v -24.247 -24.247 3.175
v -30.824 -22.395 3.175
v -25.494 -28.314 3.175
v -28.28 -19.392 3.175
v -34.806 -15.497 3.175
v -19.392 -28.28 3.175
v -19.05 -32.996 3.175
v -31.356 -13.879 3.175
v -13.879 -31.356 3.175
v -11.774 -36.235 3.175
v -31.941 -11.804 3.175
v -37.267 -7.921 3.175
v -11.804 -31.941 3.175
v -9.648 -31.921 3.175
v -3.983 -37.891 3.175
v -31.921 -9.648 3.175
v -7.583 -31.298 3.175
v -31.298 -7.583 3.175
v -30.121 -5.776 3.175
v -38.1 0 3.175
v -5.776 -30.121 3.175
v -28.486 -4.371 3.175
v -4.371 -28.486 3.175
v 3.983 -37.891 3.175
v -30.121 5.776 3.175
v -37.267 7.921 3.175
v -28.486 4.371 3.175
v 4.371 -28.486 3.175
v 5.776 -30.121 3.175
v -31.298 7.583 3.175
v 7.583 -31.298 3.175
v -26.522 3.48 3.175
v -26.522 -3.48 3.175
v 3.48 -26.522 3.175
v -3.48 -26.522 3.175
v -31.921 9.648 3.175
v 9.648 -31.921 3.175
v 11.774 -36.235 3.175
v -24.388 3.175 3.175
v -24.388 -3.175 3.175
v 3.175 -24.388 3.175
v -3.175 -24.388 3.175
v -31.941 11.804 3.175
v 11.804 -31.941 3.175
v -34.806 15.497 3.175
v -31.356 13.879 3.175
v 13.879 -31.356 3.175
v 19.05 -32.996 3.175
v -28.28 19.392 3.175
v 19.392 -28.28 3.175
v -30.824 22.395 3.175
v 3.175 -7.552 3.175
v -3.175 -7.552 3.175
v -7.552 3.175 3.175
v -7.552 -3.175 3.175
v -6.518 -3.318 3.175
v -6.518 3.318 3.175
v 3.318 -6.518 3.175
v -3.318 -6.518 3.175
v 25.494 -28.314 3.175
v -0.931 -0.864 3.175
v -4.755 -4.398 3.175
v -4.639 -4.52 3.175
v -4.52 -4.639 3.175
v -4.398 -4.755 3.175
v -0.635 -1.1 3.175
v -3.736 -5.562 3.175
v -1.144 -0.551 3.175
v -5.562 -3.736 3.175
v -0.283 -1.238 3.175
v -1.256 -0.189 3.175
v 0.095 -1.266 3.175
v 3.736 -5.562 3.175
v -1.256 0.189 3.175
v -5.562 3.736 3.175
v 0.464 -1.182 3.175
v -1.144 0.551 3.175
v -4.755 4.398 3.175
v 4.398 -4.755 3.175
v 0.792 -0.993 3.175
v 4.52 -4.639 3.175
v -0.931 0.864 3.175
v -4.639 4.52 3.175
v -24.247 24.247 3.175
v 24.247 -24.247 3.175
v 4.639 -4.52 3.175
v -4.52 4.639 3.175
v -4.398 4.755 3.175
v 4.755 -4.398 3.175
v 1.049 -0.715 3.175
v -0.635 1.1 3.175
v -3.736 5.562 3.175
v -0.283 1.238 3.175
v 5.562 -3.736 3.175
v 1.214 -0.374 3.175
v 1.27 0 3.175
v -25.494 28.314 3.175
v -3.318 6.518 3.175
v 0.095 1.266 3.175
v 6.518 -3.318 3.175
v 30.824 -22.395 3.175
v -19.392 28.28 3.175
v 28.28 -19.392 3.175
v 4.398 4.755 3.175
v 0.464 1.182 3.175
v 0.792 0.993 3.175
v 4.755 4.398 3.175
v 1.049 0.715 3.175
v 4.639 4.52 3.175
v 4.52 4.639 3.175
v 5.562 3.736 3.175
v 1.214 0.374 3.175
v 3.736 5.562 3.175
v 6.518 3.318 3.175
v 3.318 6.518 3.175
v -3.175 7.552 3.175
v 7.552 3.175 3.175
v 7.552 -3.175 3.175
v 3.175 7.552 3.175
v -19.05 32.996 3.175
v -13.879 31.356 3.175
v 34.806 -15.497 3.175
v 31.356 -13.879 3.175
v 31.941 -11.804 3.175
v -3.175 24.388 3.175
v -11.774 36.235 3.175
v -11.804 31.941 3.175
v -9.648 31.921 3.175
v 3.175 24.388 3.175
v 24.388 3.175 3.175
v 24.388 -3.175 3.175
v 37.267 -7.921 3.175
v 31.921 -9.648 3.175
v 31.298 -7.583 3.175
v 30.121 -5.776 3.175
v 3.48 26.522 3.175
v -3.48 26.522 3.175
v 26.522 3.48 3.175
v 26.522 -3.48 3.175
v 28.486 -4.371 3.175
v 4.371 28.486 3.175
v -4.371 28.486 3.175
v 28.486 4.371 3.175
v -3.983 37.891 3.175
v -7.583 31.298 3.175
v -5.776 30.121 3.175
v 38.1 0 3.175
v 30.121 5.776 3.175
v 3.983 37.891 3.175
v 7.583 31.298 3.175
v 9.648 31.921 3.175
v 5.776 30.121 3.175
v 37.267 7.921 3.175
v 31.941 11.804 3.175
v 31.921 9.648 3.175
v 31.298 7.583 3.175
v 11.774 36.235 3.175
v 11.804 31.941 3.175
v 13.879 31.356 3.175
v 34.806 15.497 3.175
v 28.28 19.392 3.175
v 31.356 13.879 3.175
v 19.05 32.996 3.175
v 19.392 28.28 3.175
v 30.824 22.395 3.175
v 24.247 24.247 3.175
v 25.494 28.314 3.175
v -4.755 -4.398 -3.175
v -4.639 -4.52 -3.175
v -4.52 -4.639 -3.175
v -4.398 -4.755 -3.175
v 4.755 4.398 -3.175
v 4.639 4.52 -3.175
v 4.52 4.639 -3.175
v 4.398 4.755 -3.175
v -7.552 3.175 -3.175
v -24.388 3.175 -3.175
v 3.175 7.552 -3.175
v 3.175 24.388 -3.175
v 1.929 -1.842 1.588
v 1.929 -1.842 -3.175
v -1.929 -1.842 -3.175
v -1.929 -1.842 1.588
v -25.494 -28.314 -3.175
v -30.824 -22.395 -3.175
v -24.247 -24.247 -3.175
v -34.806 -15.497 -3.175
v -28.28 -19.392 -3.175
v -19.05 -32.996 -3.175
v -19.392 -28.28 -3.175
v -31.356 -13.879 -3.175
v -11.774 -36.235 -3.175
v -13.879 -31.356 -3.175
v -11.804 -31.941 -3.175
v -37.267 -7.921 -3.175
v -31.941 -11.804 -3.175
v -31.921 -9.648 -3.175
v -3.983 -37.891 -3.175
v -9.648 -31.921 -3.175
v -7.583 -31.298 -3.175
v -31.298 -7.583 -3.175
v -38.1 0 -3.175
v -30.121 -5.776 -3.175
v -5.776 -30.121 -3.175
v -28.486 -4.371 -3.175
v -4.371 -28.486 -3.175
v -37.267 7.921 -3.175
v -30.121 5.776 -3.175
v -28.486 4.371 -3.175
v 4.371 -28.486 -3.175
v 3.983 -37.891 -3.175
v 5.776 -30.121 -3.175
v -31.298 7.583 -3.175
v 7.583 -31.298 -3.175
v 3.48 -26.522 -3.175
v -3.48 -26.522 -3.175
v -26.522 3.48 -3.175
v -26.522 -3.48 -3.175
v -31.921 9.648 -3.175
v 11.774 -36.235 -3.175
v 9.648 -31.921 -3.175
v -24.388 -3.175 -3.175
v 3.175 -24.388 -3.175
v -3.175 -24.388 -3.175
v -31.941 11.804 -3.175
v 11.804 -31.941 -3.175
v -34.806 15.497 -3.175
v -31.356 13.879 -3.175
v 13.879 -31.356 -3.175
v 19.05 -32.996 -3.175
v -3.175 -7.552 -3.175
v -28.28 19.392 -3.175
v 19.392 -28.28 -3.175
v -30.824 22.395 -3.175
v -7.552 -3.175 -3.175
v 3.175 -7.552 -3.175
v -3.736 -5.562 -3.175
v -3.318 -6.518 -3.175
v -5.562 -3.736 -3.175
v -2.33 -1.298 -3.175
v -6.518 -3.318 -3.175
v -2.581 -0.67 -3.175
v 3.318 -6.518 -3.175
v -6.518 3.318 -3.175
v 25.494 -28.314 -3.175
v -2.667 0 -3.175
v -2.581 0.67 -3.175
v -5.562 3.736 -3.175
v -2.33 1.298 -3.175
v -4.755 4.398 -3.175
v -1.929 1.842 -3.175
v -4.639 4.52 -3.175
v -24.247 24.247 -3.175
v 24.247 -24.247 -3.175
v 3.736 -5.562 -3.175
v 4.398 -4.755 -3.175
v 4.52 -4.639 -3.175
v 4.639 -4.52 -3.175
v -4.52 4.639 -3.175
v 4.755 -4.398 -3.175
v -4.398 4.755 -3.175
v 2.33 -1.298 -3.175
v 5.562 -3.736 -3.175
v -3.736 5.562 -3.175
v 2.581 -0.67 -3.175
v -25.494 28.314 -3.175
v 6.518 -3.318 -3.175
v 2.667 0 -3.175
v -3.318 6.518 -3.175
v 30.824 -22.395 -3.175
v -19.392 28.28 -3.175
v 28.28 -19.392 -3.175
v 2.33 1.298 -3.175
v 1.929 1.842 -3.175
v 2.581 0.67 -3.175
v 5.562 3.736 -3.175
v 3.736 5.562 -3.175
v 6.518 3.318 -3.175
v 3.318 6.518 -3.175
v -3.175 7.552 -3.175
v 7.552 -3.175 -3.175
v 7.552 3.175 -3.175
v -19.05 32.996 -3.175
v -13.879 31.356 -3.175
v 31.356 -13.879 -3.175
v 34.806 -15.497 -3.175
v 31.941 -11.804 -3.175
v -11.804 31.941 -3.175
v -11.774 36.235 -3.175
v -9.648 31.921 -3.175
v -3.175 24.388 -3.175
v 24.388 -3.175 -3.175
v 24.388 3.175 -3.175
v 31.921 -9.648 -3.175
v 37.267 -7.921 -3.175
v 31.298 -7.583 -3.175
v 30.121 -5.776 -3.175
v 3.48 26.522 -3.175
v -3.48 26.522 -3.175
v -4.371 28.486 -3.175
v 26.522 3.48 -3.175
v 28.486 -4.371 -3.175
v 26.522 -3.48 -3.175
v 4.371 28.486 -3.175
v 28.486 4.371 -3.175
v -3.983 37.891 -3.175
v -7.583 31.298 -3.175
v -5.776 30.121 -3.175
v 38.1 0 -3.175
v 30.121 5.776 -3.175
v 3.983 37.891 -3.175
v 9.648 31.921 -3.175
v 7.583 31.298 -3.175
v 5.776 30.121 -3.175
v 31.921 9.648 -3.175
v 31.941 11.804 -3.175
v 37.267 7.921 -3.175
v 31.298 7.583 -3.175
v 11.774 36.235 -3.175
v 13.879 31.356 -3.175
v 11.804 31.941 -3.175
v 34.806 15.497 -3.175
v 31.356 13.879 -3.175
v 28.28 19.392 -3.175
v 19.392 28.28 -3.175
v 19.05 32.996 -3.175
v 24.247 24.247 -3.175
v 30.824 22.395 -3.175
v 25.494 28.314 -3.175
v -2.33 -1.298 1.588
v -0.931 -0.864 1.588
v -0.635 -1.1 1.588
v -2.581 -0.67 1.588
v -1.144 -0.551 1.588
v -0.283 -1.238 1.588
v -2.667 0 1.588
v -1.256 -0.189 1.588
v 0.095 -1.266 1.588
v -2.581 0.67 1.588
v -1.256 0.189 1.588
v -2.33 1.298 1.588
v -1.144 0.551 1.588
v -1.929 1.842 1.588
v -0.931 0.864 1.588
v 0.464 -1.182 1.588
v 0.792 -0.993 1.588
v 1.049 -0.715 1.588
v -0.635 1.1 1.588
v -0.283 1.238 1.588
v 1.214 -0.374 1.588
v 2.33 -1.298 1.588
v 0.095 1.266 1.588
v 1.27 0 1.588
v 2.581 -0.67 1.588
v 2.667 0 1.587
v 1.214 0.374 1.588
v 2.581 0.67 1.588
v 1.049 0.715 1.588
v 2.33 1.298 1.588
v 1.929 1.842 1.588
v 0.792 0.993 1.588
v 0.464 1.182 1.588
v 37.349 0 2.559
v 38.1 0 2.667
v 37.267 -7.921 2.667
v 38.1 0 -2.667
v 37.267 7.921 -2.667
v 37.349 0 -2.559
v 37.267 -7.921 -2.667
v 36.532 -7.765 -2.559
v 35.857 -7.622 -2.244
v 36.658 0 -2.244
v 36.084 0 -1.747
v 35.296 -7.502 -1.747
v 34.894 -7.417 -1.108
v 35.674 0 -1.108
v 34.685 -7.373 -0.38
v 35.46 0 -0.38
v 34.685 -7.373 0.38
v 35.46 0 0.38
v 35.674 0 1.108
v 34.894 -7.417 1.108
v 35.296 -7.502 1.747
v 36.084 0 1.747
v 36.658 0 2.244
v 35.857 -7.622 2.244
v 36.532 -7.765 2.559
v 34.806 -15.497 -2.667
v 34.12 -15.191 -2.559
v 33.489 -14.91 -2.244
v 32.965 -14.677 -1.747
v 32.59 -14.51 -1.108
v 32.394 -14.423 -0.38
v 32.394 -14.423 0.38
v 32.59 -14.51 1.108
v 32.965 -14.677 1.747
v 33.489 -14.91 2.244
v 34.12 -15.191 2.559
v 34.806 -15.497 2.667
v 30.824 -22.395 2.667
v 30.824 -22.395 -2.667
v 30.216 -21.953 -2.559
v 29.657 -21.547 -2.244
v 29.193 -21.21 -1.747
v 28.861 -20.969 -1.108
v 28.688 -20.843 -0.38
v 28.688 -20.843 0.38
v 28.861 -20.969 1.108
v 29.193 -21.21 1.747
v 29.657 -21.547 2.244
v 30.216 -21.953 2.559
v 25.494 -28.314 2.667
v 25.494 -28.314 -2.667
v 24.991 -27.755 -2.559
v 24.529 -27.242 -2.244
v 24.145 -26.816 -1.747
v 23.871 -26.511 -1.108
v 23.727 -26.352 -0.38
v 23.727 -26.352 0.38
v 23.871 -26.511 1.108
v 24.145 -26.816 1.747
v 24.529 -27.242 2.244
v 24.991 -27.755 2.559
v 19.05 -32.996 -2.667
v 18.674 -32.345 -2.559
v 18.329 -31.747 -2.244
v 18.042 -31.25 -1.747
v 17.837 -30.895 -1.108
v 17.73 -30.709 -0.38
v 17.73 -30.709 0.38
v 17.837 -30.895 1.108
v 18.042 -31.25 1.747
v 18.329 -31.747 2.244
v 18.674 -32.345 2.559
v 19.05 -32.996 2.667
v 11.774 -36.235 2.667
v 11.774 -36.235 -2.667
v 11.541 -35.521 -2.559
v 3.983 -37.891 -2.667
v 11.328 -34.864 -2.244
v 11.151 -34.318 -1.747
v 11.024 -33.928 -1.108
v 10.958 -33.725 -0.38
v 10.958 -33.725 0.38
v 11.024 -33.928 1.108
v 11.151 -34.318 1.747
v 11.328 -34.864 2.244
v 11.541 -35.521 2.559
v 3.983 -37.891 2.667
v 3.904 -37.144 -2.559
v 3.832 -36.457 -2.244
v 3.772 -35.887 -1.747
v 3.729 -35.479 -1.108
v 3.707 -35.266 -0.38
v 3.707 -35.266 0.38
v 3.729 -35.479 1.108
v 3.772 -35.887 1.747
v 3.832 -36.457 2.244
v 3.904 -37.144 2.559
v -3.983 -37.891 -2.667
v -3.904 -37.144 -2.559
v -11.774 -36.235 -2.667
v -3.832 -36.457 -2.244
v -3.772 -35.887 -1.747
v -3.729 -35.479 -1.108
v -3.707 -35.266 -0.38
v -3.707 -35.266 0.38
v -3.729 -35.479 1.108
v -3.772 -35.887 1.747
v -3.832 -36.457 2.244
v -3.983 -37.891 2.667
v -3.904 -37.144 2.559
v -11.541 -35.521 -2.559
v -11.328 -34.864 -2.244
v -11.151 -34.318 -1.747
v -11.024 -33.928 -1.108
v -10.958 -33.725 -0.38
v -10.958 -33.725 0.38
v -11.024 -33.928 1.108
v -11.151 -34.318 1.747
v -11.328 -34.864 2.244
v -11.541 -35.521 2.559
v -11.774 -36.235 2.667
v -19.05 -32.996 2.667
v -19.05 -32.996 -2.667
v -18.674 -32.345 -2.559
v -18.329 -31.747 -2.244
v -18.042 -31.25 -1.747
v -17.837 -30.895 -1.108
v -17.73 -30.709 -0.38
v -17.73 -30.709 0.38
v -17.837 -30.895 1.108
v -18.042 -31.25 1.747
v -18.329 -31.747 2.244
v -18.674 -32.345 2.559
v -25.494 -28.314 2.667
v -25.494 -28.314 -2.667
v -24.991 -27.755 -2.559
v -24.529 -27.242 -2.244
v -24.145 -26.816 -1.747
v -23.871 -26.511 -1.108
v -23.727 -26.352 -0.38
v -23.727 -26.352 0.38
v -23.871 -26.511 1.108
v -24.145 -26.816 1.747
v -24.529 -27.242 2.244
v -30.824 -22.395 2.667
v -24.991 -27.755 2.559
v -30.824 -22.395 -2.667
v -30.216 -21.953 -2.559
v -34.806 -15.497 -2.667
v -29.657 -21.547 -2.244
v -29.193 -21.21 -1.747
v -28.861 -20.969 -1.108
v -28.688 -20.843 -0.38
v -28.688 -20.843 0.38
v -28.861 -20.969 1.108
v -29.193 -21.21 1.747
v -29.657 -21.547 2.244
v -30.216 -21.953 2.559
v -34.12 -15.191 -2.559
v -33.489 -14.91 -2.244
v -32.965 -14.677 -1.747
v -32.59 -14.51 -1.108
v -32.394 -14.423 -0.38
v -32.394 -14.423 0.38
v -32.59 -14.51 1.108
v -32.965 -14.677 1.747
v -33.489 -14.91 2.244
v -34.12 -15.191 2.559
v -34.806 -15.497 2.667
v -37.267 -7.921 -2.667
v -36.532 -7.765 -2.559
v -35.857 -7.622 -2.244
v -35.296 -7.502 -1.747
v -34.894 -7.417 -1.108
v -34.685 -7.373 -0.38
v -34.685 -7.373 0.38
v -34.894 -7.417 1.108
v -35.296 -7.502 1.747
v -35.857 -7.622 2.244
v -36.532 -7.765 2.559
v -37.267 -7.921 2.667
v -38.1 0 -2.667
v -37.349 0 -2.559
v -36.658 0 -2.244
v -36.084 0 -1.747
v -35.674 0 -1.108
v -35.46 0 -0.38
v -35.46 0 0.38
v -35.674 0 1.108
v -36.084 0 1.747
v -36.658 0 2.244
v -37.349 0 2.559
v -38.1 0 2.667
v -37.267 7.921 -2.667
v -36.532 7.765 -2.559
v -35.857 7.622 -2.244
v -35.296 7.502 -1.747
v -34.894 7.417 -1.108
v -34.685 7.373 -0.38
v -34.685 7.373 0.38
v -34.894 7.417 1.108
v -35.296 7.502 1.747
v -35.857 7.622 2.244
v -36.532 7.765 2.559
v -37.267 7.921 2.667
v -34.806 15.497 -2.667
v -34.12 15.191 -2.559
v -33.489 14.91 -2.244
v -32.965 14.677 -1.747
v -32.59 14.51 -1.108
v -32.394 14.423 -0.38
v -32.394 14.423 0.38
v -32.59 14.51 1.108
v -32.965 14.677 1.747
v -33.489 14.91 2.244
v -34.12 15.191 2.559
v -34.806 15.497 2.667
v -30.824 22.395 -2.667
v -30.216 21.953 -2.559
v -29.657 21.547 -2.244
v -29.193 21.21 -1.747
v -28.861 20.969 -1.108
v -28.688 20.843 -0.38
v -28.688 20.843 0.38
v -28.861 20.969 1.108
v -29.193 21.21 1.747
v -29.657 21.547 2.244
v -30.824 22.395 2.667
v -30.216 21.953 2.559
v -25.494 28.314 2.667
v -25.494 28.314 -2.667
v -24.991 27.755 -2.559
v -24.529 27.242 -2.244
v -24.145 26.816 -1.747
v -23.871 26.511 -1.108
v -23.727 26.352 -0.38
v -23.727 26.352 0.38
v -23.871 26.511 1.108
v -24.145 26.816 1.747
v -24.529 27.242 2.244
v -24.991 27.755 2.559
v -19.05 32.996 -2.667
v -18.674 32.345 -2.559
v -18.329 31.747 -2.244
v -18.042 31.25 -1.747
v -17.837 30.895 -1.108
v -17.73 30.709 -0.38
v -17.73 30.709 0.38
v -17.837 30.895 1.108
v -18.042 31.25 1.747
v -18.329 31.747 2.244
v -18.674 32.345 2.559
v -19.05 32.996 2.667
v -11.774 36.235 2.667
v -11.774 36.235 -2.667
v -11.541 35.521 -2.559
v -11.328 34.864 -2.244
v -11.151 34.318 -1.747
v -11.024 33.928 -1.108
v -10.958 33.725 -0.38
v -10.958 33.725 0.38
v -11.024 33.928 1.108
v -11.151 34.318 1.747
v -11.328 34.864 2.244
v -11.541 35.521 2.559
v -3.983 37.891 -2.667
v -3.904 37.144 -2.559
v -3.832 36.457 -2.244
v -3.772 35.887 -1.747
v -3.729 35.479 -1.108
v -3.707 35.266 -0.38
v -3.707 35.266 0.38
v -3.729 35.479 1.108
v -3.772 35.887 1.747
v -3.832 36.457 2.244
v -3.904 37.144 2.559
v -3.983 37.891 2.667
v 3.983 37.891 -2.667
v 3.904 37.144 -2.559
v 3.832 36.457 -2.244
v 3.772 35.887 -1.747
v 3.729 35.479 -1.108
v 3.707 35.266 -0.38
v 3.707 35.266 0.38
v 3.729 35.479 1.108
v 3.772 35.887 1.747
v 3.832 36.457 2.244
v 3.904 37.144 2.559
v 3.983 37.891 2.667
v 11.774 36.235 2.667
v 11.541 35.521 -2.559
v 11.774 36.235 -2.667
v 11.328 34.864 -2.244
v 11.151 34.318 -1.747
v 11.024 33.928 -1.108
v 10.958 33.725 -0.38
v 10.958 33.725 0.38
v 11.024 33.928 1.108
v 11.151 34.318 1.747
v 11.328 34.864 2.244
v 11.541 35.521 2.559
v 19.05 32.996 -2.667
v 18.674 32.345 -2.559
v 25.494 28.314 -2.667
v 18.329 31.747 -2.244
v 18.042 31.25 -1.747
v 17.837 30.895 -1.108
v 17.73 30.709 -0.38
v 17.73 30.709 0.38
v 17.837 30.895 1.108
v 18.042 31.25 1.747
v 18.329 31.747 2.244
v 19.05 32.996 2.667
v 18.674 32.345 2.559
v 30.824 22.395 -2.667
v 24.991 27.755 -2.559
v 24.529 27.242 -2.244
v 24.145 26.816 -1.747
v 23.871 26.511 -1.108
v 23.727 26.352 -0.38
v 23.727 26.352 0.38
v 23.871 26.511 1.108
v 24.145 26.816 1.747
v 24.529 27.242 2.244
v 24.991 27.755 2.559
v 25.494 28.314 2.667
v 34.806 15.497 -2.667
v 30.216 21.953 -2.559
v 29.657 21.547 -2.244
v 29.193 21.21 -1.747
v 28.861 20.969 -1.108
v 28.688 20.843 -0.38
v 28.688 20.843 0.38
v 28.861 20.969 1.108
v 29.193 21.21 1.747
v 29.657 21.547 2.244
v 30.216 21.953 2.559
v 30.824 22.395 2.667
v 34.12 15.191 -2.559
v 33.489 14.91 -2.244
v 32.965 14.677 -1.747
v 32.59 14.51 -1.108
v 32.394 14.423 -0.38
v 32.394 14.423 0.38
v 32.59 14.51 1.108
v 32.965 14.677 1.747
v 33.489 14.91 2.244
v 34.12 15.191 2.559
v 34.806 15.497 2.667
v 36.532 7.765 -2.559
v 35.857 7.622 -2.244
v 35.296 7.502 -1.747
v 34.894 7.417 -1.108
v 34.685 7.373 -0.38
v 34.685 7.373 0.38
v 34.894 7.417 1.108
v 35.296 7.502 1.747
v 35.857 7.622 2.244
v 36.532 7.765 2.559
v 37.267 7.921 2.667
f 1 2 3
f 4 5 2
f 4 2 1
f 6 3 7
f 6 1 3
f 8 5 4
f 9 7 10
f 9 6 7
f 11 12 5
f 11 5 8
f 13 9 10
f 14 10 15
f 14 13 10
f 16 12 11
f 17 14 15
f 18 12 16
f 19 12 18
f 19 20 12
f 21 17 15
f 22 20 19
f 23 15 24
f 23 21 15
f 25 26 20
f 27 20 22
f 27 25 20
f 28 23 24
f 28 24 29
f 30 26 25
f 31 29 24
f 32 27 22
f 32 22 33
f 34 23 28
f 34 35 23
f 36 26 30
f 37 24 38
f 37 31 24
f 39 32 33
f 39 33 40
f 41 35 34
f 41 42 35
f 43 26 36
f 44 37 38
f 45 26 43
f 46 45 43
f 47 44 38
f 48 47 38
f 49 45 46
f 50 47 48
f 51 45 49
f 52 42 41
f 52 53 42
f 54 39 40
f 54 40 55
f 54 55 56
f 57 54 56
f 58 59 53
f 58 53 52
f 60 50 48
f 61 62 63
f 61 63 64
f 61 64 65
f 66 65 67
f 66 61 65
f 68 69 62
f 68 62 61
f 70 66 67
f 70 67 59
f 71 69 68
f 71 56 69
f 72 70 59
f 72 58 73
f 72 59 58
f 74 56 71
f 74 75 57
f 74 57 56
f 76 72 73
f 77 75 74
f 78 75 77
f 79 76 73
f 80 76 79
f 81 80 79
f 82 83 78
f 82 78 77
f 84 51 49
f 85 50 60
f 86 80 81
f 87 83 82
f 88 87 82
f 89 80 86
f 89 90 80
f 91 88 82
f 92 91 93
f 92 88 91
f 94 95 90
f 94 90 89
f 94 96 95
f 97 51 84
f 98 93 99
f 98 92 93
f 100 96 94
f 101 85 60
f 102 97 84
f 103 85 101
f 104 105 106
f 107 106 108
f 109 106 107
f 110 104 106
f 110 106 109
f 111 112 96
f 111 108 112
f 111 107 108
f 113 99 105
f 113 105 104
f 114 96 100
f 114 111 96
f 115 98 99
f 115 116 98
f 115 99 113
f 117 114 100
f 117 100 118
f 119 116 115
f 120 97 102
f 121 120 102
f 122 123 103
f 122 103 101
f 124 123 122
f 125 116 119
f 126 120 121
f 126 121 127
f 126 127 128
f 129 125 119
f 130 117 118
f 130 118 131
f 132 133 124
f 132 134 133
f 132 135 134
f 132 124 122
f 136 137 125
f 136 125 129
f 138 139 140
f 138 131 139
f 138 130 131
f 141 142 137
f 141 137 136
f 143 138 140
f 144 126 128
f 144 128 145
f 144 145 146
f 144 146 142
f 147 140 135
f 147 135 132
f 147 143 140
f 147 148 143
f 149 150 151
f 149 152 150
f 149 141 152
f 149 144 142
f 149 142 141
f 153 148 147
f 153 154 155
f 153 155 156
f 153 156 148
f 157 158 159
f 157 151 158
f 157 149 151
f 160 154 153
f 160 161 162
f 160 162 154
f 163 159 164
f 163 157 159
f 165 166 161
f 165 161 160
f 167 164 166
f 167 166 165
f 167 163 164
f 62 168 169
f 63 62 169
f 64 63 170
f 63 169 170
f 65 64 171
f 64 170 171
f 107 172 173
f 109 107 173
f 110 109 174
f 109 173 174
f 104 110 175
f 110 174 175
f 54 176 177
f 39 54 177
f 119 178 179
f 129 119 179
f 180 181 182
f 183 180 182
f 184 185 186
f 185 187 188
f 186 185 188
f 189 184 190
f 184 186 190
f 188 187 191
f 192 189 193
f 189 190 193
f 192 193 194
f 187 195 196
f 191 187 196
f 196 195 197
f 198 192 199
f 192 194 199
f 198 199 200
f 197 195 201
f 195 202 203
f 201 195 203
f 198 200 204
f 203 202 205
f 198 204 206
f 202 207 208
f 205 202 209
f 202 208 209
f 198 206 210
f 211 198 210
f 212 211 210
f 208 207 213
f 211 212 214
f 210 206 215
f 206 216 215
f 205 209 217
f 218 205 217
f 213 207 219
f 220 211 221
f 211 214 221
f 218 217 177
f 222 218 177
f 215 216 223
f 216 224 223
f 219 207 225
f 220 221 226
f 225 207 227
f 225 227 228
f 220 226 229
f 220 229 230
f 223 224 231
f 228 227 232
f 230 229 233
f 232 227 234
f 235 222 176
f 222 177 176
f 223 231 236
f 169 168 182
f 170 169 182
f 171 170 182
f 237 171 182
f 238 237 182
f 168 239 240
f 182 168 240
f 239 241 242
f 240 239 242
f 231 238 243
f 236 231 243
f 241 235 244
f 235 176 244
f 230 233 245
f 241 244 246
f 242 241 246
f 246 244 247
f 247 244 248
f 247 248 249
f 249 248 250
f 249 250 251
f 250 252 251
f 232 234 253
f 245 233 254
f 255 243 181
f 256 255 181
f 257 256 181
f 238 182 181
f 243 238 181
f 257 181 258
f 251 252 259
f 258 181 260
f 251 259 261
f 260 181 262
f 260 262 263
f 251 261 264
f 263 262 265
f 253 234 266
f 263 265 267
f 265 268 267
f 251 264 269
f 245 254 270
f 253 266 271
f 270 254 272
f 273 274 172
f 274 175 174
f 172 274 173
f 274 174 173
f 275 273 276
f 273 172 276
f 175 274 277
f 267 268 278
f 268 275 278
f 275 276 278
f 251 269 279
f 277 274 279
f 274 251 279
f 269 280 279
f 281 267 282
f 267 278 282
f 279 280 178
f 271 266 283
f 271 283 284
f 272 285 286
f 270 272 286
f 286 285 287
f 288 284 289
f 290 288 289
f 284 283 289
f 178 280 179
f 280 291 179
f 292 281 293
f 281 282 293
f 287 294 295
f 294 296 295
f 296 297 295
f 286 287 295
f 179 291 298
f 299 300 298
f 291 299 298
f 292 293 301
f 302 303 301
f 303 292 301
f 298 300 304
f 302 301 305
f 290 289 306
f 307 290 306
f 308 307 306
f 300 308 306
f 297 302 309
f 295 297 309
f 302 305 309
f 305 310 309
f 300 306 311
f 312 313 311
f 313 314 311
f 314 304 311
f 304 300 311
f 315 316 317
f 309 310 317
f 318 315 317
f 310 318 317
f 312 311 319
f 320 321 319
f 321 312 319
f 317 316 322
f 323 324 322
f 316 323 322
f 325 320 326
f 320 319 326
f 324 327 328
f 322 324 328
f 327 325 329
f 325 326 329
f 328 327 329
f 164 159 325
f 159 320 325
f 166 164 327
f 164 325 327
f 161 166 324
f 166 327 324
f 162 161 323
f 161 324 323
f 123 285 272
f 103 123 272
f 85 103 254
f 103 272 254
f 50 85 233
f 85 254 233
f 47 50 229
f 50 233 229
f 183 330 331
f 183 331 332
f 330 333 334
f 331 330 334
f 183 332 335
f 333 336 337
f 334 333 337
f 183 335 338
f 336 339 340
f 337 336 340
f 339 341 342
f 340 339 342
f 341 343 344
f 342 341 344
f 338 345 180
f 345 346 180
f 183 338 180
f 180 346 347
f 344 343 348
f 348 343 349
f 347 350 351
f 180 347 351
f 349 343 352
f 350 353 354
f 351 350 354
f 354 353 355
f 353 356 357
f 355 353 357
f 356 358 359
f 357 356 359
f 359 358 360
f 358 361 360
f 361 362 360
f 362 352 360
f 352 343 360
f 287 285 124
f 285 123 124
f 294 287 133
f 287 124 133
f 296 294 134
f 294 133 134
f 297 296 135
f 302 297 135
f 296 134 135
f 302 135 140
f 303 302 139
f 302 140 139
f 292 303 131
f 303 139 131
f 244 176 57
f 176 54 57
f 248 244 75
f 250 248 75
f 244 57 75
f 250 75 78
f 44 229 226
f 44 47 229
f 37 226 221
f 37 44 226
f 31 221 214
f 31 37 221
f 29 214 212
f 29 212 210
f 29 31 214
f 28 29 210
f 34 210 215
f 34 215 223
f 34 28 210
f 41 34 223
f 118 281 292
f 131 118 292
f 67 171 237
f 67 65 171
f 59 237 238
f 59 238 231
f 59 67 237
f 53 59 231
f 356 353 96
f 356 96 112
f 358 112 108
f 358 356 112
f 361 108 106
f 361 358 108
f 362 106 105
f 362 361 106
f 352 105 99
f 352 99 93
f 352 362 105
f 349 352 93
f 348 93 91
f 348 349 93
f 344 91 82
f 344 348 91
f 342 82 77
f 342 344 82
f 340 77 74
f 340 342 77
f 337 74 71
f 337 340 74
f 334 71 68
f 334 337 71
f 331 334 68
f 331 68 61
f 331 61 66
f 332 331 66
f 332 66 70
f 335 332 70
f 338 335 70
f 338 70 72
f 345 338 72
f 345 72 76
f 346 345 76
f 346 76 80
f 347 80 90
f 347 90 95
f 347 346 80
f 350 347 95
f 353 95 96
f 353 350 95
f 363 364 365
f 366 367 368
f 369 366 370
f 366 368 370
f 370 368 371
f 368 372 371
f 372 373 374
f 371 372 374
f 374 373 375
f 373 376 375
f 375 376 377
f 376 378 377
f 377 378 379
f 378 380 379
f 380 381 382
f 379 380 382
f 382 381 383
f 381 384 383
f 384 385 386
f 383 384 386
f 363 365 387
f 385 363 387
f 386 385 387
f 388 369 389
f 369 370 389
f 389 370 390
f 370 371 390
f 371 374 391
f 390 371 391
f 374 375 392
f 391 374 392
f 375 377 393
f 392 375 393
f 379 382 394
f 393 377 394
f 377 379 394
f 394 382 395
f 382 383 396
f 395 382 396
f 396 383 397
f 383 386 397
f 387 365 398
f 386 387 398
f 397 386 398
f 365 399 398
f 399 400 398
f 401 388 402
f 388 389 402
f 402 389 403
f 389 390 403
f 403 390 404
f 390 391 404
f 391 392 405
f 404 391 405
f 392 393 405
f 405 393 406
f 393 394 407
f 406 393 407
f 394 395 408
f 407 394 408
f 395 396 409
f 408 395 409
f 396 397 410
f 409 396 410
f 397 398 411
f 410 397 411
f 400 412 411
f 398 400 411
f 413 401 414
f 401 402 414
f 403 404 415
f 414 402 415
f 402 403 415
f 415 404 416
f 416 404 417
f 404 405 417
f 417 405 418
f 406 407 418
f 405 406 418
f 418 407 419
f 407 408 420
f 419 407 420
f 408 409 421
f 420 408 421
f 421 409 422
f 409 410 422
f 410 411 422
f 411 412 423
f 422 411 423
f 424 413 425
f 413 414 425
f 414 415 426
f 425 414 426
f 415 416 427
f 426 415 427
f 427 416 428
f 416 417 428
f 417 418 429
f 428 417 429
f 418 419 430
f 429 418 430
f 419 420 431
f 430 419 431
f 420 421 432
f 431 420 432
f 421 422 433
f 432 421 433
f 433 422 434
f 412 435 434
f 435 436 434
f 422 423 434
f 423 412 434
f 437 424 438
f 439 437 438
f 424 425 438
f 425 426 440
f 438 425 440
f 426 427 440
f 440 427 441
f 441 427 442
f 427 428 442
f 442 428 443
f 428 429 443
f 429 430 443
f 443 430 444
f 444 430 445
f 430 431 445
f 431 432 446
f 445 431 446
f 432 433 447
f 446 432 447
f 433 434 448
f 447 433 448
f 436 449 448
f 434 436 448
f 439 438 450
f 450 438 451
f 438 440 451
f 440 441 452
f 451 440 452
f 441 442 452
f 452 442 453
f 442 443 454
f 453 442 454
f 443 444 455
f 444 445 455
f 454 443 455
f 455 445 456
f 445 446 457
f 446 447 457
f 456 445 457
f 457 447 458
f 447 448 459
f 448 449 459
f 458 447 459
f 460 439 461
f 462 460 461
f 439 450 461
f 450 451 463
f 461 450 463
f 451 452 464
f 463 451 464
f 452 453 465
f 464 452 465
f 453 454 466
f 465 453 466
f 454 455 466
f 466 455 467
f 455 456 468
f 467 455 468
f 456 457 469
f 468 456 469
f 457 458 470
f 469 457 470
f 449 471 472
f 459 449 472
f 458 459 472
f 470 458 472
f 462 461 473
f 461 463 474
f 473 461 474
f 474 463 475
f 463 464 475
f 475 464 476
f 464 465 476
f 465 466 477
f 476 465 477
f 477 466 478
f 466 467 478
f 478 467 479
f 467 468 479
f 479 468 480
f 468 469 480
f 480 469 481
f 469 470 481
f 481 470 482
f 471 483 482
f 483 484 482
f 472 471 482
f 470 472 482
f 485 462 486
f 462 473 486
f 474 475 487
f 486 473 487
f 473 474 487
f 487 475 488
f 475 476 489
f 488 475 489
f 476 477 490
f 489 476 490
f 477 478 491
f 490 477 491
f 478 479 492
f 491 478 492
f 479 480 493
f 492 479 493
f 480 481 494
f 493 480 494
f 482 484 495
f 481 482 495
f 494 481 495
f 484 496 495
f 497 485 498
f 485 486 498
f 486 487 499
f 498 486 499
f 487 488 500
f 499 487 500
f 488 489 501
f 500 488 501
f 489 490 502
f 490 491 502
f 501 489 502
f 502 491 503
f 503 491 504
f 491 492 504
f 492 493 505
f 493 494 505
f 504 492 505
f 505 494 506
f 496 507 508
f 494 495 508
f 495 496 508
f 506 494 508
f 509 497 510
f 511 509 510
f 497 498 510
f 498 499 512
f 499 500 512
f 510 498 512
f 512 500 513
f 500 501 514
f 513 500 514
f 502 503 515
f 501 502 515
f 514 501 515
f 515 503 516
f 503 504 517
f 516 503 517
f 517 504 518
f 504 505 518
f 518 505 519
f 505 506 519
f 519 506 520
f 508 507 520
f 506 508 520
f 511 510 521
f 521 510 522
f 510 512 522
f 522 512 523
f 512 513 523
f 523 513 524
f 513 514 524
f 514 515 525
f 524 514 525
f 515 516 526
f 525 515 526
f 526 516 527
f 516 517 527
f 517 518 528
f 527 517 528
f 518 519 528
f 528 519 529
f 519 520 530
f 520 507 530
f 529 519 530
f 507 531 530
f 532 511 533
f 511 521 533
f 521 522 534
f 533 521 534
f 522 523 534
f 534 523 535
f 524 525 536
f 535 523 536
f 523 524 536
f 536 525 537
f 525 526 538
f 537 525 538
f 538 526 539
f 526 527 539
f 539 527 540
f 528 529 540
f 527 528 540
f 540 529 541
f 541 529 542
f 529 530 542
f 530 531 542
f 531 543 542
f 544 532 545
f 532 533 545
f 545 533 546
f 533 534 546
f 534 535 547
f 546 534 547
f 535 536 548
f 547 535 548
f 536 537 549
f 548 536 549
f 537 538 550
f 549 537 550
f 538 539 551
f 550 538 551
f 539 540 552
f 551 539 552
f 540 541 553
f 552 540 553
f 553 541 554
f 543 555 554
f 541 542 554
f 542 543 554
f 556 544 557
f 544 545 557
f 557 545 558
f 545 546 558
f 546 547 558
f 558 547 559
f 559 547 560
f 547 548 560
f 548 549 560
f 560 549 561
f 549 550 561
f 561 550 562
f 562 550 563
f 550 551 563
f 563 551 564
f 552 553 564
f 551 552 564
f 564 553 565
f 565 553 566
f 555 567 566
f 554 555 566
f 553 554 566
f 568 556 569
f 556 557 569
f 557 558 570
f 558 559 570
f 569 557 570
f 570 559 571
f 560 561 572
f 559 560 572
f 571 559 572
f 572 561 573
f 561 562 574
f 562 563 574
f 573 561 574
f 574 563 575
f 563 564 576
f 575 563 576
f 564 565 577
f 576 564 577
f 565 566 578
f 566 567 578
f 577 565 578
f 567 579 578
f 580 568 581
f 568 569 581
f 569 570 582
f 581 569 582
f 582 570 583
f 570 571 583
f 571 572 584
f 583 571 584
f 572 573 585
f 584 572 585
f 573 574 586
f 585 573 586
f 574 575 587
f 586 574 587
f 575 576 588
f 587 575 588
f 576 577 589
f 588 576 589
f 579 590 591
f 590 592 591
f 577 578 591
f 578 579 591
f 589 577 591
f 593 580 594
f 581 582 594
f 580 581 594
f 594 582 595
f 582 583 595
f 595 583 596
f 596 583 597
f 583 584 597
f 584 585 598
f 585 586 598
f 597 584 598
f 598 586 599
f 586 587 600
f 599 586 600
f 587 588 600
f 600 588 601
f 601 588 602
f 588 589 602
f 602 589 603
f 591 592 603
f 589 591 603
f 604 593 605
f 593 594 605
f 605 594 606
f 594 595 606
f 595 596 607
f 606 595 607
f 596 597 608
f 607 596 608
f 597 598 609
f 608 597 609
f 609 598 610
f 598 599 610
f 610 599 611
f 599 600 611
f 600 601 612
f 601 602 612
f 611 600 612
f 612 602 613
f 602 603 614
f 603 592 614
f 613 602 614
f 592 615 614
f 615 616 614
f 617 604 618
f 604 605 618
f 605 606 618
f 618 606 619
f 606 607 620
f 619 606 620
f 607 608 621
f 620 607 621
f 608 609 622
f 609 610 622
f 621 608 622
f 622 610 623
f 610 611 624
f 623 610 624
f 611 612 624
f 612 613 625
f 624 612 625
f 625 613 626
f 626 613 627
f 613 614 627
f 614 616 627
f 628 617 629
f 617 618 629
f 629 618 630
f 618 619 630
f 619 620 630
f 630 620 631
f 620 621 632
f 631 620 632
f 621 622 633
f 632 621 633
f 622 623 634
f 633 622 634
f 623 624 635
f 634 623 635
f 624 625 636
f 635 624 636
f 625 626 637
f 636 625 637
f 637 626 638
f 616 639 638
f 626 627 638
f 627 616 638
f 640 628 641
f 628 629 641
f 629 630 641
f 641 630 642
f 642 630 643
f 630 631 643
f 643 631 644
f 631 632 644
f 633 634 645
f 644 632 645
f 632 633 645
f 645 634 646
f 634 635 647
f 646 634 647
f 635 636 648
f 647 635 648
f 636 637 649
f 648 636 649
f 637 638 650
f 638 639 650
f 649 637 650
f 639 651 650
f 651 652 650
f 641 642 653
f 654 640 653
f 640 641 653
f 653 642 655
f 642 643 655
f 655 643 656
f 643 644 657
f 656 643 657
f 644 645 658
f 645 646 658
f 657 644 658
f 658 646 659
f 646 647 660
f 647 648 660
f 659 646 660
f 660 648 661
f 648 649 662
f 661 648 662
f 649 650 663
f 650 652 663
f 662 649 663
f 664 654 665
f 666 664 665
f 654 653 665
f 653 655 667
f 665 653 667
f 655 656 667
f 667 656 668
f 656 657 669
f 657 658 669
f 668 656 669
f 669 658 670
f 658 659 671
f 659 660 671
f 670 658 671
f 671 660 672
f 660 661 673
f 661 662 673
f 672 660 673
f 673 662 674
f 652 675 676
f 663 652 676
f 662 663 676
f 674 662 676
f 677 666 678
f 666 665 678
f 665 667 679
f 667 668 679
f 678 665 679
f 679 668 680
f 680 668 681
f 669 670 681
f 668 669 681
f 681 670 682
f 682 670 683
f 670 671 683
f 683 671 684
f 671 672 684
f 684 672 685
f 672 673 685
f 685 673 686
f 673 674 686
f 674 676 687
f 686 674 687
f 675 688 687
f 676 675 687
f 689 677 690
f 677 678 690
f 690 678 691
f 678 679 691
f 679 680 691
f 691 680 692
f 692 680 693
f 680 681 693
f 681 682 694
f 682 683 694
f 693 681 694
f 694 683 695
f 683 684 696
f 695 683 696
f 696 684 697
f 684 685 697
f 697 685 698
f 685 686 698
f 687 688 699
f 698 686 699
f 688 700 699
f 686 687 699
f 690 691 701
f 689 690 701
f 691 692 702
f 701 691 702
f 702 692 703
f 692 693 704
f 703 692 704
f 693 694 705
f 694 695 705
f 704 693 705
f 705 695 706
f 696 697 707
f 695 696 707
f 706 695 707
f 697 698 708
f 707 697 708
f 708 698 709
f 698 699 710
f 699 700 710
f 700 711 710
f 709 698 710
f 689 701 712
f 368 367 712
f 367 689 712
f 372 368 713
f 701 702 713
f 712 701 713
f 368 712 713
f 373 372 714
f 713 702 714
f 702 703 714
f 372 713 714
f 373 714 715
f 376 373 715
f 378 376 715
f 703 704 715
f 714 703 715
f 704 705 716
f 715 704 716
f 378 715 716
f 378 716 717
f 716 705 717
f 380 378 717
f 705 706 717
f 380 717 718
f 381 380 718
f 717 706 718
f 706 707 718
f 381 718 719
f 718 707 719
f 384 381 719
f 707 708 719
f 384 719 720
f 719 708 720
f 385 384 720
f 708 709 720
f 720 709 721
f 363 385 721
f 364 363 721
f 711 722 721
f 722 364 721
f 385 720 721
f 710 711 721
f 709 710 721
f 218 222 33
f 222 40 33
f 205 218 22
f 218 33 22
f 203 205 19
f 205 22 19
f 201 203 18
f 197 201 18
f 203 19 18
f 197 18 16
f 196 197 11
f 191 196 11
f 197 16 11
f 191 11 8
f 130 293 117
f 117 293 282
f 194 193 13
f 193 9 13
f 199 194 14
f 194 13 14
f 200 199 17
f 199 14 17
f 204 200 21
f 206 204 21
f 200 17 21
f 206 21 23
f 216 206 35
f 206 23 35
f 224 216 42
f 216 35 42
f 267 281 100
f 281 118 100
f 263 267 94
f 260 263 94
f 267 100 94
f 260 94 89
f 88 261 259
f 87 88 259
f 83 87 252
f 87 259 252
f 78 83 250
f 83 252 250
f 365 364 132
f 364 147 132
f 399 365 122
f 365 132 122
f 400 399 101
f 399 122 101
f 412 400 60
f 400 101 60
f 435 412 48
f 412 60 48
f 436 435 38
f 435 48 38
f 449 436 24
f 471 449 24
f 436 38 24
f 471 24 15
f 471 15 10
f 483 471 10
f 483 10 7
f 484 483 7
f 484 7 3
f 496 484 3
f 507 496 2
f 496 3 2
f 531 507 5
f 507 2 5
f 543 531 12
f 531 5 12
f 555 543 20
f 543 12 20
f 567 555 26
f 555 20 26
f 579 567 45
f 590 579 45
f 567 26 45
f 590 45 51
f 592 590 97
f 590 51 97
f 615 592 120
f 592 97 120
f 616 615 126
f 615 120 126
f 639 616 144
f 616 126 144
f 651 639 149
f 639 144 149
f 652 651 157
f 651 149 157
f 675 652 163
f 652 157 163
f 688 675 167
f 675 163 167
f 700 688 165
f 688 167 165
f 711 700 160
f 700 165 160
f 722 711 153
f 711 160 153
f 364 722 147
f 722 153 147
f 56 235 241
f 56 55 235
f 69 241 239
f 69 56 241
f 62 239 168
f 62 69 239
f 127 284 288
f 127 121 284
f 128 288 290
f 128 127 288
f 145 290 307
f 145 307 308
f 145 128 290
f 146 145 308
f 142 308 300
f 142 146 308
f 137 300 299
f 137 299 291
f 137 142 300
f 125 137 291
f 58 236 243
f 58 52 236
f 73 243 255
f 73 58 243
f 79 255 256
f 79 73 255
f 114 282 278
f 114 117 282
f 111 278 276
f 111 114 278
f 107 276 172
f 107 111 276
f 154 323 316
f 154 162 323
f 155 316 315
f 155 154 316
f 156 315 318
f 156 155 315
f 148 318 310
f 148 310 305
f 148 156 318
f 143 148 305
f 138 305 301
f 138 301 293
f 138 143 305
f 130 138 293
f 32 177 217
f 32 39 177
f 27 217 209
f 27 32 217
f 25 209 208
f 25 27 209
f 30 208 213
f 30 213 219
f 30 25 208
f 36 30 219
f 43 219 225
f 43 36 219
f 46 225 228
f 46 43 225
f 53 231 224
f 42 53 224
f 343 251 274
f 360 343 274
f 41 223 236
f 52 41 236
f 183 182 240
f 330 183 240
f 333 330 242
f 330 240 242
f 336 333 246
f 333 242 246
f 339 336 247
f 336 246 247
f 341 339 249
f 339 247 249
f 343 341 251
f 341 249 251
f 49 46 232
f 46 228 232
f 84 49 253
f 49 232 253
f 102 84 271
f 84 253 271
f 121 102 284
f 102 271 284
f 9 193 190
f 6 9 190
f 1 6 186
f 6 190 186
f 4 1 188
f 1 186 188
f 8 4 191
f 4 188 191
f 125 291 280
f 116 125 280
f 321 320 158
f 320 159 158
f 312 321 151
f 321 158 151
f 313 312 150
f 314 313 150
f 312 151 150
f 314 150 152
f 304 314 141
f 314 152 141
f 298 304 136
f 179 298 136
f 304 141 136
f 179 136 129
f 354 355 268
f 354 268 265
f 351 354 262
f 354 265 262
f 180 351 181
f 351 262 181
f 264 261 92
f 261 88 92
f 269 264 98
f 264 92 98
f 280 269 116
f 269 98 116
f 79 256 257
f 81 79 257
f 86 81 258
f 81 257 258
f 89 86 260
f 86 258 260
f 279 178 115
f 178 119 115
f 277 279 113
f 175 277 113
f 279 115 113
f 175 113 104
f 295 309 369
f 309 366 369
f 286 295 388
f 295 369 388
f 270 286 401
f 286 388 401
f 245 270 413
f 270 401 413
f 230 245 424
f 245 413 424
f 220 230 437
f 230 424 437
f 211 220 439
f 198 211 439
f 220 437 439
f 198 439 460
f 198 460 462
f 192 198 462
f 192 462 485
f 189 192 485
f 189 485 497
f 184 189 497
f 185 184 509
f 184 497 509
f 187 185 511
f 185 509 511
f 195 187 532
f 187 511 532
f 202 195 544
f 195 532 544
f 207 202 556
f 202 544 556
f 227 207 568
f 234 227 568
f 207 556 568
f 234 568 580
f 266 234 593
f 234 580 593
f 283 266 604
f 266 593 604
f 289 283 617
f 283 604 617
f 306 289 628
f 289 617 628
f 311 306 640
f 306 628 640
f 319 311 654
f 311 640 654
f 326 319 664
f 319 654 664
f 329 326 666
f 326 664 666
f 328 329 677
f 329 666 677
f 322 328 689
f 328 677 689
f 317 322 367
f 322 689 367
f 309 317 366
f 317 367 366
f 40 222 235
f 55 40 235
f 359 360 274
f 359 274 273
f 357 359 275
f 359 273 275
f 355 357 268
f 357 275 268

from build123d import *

# Parameters (mm, degrees)
BOSS_EXTRUDE1_START = -6.35
SKETCH3_W           = 6.35
SKETCH3_H           = 6.35
BOSS_EXTRUDE1_DEPTH = 6.35
FILLET1_R           = 7.62
FILLET2_R           = 3.81
BOSS_EXTRUDE2_START = -1.5875
SKETCH4_R           = 1.27
BOSS_EXTRUDE2_DEPTH = 1.5875


with BuildPart() as part:
    # Sketch2 → Revolve1 (revolve)
    with BuildSketch(Plane(origin=(0, 0, 0), x_dir=(1, 0, 0), z_dir=(0, 1, 0))):
        with BuildLine():
            ThreePointArc((38.1, 2.667), (35.433, 0), (38.1, -2.667))
            Line((38.1, -2.667), (38.1, -3.175))
            Line((38.1, -3.175), (34.29, -3.175))
            Line((34.29, -3.175), (34.29, 3.175))
            Line((34.29, 3.175), (38.1, 3.175))
            Line((38.1, 3.175), (38.1, 2.667))
        make_face()
    revolve(axis=Axis((0, 0, 2.667), (0, 0, -1)))

    # Sketch3 → Boss-Extrude1 (add)
    # profile 1 of 19: a face of its own
    with BuildSketch(Plane.XY.offset(3.175).offset(BOSS_EXTRUDE1_START)):
        with BuildLine():
            ThreePointArc((-34.142692849, 3.175), (-34.29, 0), (-34.142692849, -3.175))
            Line((-34.142692849, -3.175), (-5.645432136, -3.175))
            ThreePointArc((-5.645432136, -3.175), (-6.477, 0), (-5.645432136, 3.175))
            Line((-5.645432136, 3.175), (-34.142692849, 3.175))
        make_face()
    # profile 2 of 19: a face of its own
    with BuildSketch(Plane.XY.offset(3.175).offset(BOSS_EXTRUDE1_START)):
        with BuildLine():
            Line((5.645432136, -3.175), (34.142692849, -3.175))
            ThreePointArc((34.142692849, -3.175), (34.253153415, -1.589207695), (34.29, 0))
            ThreePointArc((34.29, 0), (34.253153415, 1.589207695), (34.142692849, 3.175))
            Line((34.142692849, 3.175), (5.645432136, 3.175))
            ThreePointArc((5.645432136, 3.175), (6.265660099, 1.641046169), (6.477, 0))
            ThreePointArc((6.477, 0), (6.265660099, -1.641046169), (5.645432136, -3.175))
        make_face()
    # profile 3 of 19: a face of its own
    with BuildSketch(Plane.XY.offset(3.175).offset(BOSS_EXTRUDE1_START)):
        with BuildLine():
            ThreePointArc((-5.645432136, 3.175), (-6.477, 0), (-5.645432136, -3.175))
            Line((-5.645432136, -3.175), (-3.175, -3.175))
            Line((-3.175, -3.175), (-3.175, 3.175))
            Line((-3.175, 3.175), (-5.645432136, 3.175))
        make_face()
    # profile 4 of 19: a face of its own
    with BuildSketch(Plane.XY.offset(3.175).offset(BOSS_EXTRUDE1_START)):
        with BuildLine():
            Line((-3.175, 5.645432136), (-3.175, 3.175))
            Line((-3.175, 3.175), (3.175, 3.175))
            Line((3.175, 3.175), (3.175, 5.645432136))
            ThreePointArc((3.175, 5.645432136), (0, 6.477), (-3.175, 5.645432136))
        make_face()
    # profile 5 of 19: a face of its own
    with BuildSketch(Plane.XY.offset(3.175).offset(BOSS_EXTRUDE1_START)):
        with BuildLine():
            Line((-3.175, -5.645432136), (-3.175, -34.142692849))
            ThreePointArc((-3.175, -34.142692849), (0, -34.29), (3.175, -34.142692849))
            Line((3.175, -34.142692849), (3.175, -5.645432136))
            ThreePointArc((3.175, -5.645432136), (0, -6.477), (-3.175, -5.645432136))
        make_face()
    # profile 6 of 19: a face of its own
    with BuildSketch(Plane.XY.offset(3.175).offset(BOSS_EXTRUDE1_START)):
        with BuildLine():
            ThreePointArc((3.175, 34.142692849), (0, 34.29), (-3.175, 34.142692849))
            Line((-3.175, 34.142692849), (-3.175, 5.645432136))
            ThreePointArc((-3.175, 5.645432136), (0, 6.477), (3.175, 5.645432136))
            Line((3.175, 5.645432136), (3.175, 34.142692849))
        make_face()
    # profile 7 of 19: a face of its own
    with BuildSketch(Plane.XY.offset(3.175).offset(BOSS_EXTRUDE1_START)):
        with BuildLine():
            ThreePointArc((-3.175, 5.645432136), (-4.579930622, 4.579930622), (-5.645432136, 3.175))
            Line((-5.645432136, 3.175), (-3.175, 3.175))
            Line((-3.175, 3.175), (-3.175, 5.645432136))
        make_face()
    # profile 8 of 19: a face of its own
    with BuildSketch(Plane.XY.offset(3.175).offset(BOSS_EXTRUDE1_START)):
        with BuildLine():
            Line((3.175, 5.645432136), (3.175, 3.175))
            Line((3.175, 3.175), (5.645432136, 3.175))
            ThreePointArc((5.645432136, 3.175), (4.579930622, 4.579930622), (3.175, 5.645432136))
        make_face()
    # profile 9 of 19: a face of its own
    with BuildSketch(Plane.XY.offset(3.175).offset(BOSS_EXTRUDE1_START)):
        with BuildLine():
            Line((3.175, 3.175), (3.175, -3.175))
            Line((3.175, -3.175), (5.645432136, -3.175))
            ThreePointArc((5.645432136, -3.175), (6.265660099, -1.641046169), (6.477, 0))
            ThreePointArc((6.477, 0), (6.265660099, 1.641046169), (5.645432136, 3.175))
            Line((5.645432136, 3.175), (3.175, 3.175))
        make_face()
    # profile 10 of 19: a face of its own
    with BuildSketch(Plane.XY.offset(3.175).offset(BOSS_EXTRUDE1_START)):
        with BuildLine():
            ThreePointArc((-34.142692849, 3.175), (-34.29, 0), (-34.142692849, -3.175))
            Line((-34.142692849, -3.175), (-5.645432136, -3.175))
            ThreePointArc((-5.645432136, -3.175), (-6.477, 0), (-5.645432136, 3.175))
            Line((-5.645432136, 3.175), (-34.142692849, 3.175))
        make_face()
    # profile 11 of 19: a face of its own
    with BuildSketch(Plane.XY.offset(3.175).offset(BOSS_EXTRUDE1_START)):
        with BuildLine():
            Line((5.645432136, -3.175), (34.142692849, -3.175))
            ThreePointArc((34.142692849, -3.175), (34.253153415, -1.589207695), (34.29, 0))
            ThreePointArc((34.29, 0), (34.253153415, 1.589207695), (34.142692849, 3.175))
            Line((34.142692849, 3.175), (5.645432136, 3.175))
            ThreePointArc((5.645432136, 3.175), (6.265660099, 1.641046169), (6.477, 0))
            ThreePointArc((6.477, 0), (6.265660099, -1.641046169), (5.645432136, -3.175))
        make_face()
    # profile 12 of 19: a face of its own
    with BuildSketch(Plane.XY.offset(3.175).offset(BOSS_EXTRUDE1_START)):
        with BuildLine():
            Line((-3.175, -5.645432136), (-3.175, -34.142692849))
            ThreePointArc((-3.175, -34.142692849), (0, -34.29), (3.175, -34.142692849))
            Line((3.175, -34.142692849), (3.175, -5.645432136))
            ThreePointArc((3.175, -5.645432136), (0, -6.477), (-3.175, -5.645432136))
        make_face()
    # profile 13 of 19: a face of its own
    with BuildSketch(Plane.XY.offset(3.175).offset(BOSS_EXTRUDE1_START)):
        with BuildLine():
            ThreePointArc((3.175, 34.142692849), (0, 34.29), (-3.175, 34.142692849))
            Line((-3.175, 34.142692849), (-3.175, 5.645432136))
            ThreePointArc((-3.175, 5.645432136), (0, 6.477), (3.175, 5.645432136))
            Line((3.175, 5.645432136), (3.175, 34.142692849))
        make_face()
    # profile 14 of 19: a face of its own
    with BuildSketch(Plane.XY.offset(3.175).offset(BOSS_EXTRUDE1_START)):
        with BuildLine():
            Line((3.175, -3.175), (-3.175, -3.175))
            Line((-3.175, -3.175), (-3.175, -5.645432136))
            ThreePointArc((-3.175, -5.645432136), (0, -6.477), (3.175, -5.645432136))
            Line((3.175, -5.645432136), (3.175, -3.175))
        make_face()
    # profile 15 of 19: a face of its own
    with BuildSketch(Plane.XY.offset(3.175).offset(BOSS_EXTRUDE1_START)):
        with BuildLine():
            Line((-3.175, -3.175), (-5.645432136, -3.175))
            ThreePointArc((-5.645432136, -3.175), (-4.579930622, -4.579930622), (-3.175, -5.645432136))
            Line((-3.175, -5.645432136), (-3.175, -3.175))
        make_face()
    # profile 16 of 19: a face of its own
    with BuildSketch(Plane.XY.offset(3.175).offset(BOSS_EXTRUDE1_START)):
        with BuildLine():
            Line((5.645432136, -3.175), (3.175, -3.175))
            Line((3.175, -3.175), (3.175, -5.645432136))
            ThreePointArc((3.175, -5.645432136), (4.579930622, -4.579930622), (5.645432136, -3.175))
        make_face()
    # profile 17 of 19: a face of its own
    with BuildSketch(Plane.XY.offset(3.175).offset(BOSS_EXTRUDE1_START)):
        Rectangle(SKETCH3_W, SKETCH3_H)
        with BuildLine():
            ThreePointArc((-1.929188106, 1.8415), (0, 2.667), (1.929188106, 1.8415))
            ThreePointArc((1.929188106, 1.8415), (2.475685125, 0.991903302), (2.667, 0))
            ThreePointArc((2.667, 0), (2.475685125, -0.991903302), (1.929188106, -1.8415))
            ThreePointArc((1.929188106, -1.8415), (0, -2.667), (-1.929188106, -1.8415))
            ThreePointArc((-1.929188106, -1.8415), (-2.667, 0), (-1.929188106, 1.8415))
        make_face(mode=Mode.SUBTRACT)
    # profile 18 of 19: a face of its own
    with BuildSketch(Plane.XY.offset(3.175).offset(BOSS_EXTRUDE1_START)):
        with BuildLine():
            Line((-1.929188106, 1.8415), (1.929188106, 1.8415))
            ThreePointArc((1.929188106, 1.8415), (0, 2.667), (-1.929188106, 1.8415))
        make_face()
    # profile 19 of 19: a face of its own
    with BuildSketch(Plane.XY.offset(3.175).offset(BOSS_EXTRUDE1_START)):
        with BuildLine():
            Line((1.929188106, -1.8415), (-1.929188106, -1.8415))
            ThreePointArc((-1.929188106, -1.8415), (0, -2.667), (1.929188106, -1.8415))
        make_face()
    extrude(amount=BOSS_EXTRUDE1_DEPTH)

    # Fillet1
    fillet1_edges = [part.edges().sort_by_distance(p)[0] for p in [
        (34.142692849, -3.175, 0),
        (34.142692849, 3.175, 0),
        (3.175, 34.142692849, 0),
        (-3.175, 34.142692849, 0),
        (-34.142692849, 3.175, 0),
        (-34.142692849, -3.175, 0),
        (-3.175, -34.142692849, 0),
        (3.175, -34.142692849, 0),
    ]]
    fillet(fillet1_edges, radius=FILLET1_R)

    # Fillet2
    fillet2_edges = [part.edges().sort_by_distance(p)[0] for p in [
        (5.645432136, 3.175, 0),
        (3.175, 5.645432136, 0),
        (-3.175, 5.645432136, 0),
        (-5.645432136, 3.175, 0),
        (-5.645432136, -3.175, 0),
        (-3.175, -5.645432136, 0),
        (3.175, -5.645432136, 0),
        (5.645432136, -3.175, 0),
    ]]
    fillet(fillet2_edges, radius=FILLET2_R)

    # Sketch4 → Boss-Extrude2 (add)
    with BuildSketch(Plane.XY.offset(3.175).offset(BOSS_EXTRUDE2_START)):
        with BuildLine():
            Line((1.929188106, 1.8415), (-1.929188106, 1.8415))
            ThreePointArc((-1.929188106, 1.8415), (-2.667, 0), (-1.929188106, -1.8415))
            Line((-1.929188106, -1.8415), (1.929188106, -1.8415))
            ThreePointArc((1.929188106, -1.8415), (2.667, 0), (1.929188106, 1.8415))
        make_face()
        Circle(SKETCH4_R, mode=Mode.SUBTRACT)
    extrude(amount=BOSS_EXTRUDE2_DEPTH)


solid = part.part
